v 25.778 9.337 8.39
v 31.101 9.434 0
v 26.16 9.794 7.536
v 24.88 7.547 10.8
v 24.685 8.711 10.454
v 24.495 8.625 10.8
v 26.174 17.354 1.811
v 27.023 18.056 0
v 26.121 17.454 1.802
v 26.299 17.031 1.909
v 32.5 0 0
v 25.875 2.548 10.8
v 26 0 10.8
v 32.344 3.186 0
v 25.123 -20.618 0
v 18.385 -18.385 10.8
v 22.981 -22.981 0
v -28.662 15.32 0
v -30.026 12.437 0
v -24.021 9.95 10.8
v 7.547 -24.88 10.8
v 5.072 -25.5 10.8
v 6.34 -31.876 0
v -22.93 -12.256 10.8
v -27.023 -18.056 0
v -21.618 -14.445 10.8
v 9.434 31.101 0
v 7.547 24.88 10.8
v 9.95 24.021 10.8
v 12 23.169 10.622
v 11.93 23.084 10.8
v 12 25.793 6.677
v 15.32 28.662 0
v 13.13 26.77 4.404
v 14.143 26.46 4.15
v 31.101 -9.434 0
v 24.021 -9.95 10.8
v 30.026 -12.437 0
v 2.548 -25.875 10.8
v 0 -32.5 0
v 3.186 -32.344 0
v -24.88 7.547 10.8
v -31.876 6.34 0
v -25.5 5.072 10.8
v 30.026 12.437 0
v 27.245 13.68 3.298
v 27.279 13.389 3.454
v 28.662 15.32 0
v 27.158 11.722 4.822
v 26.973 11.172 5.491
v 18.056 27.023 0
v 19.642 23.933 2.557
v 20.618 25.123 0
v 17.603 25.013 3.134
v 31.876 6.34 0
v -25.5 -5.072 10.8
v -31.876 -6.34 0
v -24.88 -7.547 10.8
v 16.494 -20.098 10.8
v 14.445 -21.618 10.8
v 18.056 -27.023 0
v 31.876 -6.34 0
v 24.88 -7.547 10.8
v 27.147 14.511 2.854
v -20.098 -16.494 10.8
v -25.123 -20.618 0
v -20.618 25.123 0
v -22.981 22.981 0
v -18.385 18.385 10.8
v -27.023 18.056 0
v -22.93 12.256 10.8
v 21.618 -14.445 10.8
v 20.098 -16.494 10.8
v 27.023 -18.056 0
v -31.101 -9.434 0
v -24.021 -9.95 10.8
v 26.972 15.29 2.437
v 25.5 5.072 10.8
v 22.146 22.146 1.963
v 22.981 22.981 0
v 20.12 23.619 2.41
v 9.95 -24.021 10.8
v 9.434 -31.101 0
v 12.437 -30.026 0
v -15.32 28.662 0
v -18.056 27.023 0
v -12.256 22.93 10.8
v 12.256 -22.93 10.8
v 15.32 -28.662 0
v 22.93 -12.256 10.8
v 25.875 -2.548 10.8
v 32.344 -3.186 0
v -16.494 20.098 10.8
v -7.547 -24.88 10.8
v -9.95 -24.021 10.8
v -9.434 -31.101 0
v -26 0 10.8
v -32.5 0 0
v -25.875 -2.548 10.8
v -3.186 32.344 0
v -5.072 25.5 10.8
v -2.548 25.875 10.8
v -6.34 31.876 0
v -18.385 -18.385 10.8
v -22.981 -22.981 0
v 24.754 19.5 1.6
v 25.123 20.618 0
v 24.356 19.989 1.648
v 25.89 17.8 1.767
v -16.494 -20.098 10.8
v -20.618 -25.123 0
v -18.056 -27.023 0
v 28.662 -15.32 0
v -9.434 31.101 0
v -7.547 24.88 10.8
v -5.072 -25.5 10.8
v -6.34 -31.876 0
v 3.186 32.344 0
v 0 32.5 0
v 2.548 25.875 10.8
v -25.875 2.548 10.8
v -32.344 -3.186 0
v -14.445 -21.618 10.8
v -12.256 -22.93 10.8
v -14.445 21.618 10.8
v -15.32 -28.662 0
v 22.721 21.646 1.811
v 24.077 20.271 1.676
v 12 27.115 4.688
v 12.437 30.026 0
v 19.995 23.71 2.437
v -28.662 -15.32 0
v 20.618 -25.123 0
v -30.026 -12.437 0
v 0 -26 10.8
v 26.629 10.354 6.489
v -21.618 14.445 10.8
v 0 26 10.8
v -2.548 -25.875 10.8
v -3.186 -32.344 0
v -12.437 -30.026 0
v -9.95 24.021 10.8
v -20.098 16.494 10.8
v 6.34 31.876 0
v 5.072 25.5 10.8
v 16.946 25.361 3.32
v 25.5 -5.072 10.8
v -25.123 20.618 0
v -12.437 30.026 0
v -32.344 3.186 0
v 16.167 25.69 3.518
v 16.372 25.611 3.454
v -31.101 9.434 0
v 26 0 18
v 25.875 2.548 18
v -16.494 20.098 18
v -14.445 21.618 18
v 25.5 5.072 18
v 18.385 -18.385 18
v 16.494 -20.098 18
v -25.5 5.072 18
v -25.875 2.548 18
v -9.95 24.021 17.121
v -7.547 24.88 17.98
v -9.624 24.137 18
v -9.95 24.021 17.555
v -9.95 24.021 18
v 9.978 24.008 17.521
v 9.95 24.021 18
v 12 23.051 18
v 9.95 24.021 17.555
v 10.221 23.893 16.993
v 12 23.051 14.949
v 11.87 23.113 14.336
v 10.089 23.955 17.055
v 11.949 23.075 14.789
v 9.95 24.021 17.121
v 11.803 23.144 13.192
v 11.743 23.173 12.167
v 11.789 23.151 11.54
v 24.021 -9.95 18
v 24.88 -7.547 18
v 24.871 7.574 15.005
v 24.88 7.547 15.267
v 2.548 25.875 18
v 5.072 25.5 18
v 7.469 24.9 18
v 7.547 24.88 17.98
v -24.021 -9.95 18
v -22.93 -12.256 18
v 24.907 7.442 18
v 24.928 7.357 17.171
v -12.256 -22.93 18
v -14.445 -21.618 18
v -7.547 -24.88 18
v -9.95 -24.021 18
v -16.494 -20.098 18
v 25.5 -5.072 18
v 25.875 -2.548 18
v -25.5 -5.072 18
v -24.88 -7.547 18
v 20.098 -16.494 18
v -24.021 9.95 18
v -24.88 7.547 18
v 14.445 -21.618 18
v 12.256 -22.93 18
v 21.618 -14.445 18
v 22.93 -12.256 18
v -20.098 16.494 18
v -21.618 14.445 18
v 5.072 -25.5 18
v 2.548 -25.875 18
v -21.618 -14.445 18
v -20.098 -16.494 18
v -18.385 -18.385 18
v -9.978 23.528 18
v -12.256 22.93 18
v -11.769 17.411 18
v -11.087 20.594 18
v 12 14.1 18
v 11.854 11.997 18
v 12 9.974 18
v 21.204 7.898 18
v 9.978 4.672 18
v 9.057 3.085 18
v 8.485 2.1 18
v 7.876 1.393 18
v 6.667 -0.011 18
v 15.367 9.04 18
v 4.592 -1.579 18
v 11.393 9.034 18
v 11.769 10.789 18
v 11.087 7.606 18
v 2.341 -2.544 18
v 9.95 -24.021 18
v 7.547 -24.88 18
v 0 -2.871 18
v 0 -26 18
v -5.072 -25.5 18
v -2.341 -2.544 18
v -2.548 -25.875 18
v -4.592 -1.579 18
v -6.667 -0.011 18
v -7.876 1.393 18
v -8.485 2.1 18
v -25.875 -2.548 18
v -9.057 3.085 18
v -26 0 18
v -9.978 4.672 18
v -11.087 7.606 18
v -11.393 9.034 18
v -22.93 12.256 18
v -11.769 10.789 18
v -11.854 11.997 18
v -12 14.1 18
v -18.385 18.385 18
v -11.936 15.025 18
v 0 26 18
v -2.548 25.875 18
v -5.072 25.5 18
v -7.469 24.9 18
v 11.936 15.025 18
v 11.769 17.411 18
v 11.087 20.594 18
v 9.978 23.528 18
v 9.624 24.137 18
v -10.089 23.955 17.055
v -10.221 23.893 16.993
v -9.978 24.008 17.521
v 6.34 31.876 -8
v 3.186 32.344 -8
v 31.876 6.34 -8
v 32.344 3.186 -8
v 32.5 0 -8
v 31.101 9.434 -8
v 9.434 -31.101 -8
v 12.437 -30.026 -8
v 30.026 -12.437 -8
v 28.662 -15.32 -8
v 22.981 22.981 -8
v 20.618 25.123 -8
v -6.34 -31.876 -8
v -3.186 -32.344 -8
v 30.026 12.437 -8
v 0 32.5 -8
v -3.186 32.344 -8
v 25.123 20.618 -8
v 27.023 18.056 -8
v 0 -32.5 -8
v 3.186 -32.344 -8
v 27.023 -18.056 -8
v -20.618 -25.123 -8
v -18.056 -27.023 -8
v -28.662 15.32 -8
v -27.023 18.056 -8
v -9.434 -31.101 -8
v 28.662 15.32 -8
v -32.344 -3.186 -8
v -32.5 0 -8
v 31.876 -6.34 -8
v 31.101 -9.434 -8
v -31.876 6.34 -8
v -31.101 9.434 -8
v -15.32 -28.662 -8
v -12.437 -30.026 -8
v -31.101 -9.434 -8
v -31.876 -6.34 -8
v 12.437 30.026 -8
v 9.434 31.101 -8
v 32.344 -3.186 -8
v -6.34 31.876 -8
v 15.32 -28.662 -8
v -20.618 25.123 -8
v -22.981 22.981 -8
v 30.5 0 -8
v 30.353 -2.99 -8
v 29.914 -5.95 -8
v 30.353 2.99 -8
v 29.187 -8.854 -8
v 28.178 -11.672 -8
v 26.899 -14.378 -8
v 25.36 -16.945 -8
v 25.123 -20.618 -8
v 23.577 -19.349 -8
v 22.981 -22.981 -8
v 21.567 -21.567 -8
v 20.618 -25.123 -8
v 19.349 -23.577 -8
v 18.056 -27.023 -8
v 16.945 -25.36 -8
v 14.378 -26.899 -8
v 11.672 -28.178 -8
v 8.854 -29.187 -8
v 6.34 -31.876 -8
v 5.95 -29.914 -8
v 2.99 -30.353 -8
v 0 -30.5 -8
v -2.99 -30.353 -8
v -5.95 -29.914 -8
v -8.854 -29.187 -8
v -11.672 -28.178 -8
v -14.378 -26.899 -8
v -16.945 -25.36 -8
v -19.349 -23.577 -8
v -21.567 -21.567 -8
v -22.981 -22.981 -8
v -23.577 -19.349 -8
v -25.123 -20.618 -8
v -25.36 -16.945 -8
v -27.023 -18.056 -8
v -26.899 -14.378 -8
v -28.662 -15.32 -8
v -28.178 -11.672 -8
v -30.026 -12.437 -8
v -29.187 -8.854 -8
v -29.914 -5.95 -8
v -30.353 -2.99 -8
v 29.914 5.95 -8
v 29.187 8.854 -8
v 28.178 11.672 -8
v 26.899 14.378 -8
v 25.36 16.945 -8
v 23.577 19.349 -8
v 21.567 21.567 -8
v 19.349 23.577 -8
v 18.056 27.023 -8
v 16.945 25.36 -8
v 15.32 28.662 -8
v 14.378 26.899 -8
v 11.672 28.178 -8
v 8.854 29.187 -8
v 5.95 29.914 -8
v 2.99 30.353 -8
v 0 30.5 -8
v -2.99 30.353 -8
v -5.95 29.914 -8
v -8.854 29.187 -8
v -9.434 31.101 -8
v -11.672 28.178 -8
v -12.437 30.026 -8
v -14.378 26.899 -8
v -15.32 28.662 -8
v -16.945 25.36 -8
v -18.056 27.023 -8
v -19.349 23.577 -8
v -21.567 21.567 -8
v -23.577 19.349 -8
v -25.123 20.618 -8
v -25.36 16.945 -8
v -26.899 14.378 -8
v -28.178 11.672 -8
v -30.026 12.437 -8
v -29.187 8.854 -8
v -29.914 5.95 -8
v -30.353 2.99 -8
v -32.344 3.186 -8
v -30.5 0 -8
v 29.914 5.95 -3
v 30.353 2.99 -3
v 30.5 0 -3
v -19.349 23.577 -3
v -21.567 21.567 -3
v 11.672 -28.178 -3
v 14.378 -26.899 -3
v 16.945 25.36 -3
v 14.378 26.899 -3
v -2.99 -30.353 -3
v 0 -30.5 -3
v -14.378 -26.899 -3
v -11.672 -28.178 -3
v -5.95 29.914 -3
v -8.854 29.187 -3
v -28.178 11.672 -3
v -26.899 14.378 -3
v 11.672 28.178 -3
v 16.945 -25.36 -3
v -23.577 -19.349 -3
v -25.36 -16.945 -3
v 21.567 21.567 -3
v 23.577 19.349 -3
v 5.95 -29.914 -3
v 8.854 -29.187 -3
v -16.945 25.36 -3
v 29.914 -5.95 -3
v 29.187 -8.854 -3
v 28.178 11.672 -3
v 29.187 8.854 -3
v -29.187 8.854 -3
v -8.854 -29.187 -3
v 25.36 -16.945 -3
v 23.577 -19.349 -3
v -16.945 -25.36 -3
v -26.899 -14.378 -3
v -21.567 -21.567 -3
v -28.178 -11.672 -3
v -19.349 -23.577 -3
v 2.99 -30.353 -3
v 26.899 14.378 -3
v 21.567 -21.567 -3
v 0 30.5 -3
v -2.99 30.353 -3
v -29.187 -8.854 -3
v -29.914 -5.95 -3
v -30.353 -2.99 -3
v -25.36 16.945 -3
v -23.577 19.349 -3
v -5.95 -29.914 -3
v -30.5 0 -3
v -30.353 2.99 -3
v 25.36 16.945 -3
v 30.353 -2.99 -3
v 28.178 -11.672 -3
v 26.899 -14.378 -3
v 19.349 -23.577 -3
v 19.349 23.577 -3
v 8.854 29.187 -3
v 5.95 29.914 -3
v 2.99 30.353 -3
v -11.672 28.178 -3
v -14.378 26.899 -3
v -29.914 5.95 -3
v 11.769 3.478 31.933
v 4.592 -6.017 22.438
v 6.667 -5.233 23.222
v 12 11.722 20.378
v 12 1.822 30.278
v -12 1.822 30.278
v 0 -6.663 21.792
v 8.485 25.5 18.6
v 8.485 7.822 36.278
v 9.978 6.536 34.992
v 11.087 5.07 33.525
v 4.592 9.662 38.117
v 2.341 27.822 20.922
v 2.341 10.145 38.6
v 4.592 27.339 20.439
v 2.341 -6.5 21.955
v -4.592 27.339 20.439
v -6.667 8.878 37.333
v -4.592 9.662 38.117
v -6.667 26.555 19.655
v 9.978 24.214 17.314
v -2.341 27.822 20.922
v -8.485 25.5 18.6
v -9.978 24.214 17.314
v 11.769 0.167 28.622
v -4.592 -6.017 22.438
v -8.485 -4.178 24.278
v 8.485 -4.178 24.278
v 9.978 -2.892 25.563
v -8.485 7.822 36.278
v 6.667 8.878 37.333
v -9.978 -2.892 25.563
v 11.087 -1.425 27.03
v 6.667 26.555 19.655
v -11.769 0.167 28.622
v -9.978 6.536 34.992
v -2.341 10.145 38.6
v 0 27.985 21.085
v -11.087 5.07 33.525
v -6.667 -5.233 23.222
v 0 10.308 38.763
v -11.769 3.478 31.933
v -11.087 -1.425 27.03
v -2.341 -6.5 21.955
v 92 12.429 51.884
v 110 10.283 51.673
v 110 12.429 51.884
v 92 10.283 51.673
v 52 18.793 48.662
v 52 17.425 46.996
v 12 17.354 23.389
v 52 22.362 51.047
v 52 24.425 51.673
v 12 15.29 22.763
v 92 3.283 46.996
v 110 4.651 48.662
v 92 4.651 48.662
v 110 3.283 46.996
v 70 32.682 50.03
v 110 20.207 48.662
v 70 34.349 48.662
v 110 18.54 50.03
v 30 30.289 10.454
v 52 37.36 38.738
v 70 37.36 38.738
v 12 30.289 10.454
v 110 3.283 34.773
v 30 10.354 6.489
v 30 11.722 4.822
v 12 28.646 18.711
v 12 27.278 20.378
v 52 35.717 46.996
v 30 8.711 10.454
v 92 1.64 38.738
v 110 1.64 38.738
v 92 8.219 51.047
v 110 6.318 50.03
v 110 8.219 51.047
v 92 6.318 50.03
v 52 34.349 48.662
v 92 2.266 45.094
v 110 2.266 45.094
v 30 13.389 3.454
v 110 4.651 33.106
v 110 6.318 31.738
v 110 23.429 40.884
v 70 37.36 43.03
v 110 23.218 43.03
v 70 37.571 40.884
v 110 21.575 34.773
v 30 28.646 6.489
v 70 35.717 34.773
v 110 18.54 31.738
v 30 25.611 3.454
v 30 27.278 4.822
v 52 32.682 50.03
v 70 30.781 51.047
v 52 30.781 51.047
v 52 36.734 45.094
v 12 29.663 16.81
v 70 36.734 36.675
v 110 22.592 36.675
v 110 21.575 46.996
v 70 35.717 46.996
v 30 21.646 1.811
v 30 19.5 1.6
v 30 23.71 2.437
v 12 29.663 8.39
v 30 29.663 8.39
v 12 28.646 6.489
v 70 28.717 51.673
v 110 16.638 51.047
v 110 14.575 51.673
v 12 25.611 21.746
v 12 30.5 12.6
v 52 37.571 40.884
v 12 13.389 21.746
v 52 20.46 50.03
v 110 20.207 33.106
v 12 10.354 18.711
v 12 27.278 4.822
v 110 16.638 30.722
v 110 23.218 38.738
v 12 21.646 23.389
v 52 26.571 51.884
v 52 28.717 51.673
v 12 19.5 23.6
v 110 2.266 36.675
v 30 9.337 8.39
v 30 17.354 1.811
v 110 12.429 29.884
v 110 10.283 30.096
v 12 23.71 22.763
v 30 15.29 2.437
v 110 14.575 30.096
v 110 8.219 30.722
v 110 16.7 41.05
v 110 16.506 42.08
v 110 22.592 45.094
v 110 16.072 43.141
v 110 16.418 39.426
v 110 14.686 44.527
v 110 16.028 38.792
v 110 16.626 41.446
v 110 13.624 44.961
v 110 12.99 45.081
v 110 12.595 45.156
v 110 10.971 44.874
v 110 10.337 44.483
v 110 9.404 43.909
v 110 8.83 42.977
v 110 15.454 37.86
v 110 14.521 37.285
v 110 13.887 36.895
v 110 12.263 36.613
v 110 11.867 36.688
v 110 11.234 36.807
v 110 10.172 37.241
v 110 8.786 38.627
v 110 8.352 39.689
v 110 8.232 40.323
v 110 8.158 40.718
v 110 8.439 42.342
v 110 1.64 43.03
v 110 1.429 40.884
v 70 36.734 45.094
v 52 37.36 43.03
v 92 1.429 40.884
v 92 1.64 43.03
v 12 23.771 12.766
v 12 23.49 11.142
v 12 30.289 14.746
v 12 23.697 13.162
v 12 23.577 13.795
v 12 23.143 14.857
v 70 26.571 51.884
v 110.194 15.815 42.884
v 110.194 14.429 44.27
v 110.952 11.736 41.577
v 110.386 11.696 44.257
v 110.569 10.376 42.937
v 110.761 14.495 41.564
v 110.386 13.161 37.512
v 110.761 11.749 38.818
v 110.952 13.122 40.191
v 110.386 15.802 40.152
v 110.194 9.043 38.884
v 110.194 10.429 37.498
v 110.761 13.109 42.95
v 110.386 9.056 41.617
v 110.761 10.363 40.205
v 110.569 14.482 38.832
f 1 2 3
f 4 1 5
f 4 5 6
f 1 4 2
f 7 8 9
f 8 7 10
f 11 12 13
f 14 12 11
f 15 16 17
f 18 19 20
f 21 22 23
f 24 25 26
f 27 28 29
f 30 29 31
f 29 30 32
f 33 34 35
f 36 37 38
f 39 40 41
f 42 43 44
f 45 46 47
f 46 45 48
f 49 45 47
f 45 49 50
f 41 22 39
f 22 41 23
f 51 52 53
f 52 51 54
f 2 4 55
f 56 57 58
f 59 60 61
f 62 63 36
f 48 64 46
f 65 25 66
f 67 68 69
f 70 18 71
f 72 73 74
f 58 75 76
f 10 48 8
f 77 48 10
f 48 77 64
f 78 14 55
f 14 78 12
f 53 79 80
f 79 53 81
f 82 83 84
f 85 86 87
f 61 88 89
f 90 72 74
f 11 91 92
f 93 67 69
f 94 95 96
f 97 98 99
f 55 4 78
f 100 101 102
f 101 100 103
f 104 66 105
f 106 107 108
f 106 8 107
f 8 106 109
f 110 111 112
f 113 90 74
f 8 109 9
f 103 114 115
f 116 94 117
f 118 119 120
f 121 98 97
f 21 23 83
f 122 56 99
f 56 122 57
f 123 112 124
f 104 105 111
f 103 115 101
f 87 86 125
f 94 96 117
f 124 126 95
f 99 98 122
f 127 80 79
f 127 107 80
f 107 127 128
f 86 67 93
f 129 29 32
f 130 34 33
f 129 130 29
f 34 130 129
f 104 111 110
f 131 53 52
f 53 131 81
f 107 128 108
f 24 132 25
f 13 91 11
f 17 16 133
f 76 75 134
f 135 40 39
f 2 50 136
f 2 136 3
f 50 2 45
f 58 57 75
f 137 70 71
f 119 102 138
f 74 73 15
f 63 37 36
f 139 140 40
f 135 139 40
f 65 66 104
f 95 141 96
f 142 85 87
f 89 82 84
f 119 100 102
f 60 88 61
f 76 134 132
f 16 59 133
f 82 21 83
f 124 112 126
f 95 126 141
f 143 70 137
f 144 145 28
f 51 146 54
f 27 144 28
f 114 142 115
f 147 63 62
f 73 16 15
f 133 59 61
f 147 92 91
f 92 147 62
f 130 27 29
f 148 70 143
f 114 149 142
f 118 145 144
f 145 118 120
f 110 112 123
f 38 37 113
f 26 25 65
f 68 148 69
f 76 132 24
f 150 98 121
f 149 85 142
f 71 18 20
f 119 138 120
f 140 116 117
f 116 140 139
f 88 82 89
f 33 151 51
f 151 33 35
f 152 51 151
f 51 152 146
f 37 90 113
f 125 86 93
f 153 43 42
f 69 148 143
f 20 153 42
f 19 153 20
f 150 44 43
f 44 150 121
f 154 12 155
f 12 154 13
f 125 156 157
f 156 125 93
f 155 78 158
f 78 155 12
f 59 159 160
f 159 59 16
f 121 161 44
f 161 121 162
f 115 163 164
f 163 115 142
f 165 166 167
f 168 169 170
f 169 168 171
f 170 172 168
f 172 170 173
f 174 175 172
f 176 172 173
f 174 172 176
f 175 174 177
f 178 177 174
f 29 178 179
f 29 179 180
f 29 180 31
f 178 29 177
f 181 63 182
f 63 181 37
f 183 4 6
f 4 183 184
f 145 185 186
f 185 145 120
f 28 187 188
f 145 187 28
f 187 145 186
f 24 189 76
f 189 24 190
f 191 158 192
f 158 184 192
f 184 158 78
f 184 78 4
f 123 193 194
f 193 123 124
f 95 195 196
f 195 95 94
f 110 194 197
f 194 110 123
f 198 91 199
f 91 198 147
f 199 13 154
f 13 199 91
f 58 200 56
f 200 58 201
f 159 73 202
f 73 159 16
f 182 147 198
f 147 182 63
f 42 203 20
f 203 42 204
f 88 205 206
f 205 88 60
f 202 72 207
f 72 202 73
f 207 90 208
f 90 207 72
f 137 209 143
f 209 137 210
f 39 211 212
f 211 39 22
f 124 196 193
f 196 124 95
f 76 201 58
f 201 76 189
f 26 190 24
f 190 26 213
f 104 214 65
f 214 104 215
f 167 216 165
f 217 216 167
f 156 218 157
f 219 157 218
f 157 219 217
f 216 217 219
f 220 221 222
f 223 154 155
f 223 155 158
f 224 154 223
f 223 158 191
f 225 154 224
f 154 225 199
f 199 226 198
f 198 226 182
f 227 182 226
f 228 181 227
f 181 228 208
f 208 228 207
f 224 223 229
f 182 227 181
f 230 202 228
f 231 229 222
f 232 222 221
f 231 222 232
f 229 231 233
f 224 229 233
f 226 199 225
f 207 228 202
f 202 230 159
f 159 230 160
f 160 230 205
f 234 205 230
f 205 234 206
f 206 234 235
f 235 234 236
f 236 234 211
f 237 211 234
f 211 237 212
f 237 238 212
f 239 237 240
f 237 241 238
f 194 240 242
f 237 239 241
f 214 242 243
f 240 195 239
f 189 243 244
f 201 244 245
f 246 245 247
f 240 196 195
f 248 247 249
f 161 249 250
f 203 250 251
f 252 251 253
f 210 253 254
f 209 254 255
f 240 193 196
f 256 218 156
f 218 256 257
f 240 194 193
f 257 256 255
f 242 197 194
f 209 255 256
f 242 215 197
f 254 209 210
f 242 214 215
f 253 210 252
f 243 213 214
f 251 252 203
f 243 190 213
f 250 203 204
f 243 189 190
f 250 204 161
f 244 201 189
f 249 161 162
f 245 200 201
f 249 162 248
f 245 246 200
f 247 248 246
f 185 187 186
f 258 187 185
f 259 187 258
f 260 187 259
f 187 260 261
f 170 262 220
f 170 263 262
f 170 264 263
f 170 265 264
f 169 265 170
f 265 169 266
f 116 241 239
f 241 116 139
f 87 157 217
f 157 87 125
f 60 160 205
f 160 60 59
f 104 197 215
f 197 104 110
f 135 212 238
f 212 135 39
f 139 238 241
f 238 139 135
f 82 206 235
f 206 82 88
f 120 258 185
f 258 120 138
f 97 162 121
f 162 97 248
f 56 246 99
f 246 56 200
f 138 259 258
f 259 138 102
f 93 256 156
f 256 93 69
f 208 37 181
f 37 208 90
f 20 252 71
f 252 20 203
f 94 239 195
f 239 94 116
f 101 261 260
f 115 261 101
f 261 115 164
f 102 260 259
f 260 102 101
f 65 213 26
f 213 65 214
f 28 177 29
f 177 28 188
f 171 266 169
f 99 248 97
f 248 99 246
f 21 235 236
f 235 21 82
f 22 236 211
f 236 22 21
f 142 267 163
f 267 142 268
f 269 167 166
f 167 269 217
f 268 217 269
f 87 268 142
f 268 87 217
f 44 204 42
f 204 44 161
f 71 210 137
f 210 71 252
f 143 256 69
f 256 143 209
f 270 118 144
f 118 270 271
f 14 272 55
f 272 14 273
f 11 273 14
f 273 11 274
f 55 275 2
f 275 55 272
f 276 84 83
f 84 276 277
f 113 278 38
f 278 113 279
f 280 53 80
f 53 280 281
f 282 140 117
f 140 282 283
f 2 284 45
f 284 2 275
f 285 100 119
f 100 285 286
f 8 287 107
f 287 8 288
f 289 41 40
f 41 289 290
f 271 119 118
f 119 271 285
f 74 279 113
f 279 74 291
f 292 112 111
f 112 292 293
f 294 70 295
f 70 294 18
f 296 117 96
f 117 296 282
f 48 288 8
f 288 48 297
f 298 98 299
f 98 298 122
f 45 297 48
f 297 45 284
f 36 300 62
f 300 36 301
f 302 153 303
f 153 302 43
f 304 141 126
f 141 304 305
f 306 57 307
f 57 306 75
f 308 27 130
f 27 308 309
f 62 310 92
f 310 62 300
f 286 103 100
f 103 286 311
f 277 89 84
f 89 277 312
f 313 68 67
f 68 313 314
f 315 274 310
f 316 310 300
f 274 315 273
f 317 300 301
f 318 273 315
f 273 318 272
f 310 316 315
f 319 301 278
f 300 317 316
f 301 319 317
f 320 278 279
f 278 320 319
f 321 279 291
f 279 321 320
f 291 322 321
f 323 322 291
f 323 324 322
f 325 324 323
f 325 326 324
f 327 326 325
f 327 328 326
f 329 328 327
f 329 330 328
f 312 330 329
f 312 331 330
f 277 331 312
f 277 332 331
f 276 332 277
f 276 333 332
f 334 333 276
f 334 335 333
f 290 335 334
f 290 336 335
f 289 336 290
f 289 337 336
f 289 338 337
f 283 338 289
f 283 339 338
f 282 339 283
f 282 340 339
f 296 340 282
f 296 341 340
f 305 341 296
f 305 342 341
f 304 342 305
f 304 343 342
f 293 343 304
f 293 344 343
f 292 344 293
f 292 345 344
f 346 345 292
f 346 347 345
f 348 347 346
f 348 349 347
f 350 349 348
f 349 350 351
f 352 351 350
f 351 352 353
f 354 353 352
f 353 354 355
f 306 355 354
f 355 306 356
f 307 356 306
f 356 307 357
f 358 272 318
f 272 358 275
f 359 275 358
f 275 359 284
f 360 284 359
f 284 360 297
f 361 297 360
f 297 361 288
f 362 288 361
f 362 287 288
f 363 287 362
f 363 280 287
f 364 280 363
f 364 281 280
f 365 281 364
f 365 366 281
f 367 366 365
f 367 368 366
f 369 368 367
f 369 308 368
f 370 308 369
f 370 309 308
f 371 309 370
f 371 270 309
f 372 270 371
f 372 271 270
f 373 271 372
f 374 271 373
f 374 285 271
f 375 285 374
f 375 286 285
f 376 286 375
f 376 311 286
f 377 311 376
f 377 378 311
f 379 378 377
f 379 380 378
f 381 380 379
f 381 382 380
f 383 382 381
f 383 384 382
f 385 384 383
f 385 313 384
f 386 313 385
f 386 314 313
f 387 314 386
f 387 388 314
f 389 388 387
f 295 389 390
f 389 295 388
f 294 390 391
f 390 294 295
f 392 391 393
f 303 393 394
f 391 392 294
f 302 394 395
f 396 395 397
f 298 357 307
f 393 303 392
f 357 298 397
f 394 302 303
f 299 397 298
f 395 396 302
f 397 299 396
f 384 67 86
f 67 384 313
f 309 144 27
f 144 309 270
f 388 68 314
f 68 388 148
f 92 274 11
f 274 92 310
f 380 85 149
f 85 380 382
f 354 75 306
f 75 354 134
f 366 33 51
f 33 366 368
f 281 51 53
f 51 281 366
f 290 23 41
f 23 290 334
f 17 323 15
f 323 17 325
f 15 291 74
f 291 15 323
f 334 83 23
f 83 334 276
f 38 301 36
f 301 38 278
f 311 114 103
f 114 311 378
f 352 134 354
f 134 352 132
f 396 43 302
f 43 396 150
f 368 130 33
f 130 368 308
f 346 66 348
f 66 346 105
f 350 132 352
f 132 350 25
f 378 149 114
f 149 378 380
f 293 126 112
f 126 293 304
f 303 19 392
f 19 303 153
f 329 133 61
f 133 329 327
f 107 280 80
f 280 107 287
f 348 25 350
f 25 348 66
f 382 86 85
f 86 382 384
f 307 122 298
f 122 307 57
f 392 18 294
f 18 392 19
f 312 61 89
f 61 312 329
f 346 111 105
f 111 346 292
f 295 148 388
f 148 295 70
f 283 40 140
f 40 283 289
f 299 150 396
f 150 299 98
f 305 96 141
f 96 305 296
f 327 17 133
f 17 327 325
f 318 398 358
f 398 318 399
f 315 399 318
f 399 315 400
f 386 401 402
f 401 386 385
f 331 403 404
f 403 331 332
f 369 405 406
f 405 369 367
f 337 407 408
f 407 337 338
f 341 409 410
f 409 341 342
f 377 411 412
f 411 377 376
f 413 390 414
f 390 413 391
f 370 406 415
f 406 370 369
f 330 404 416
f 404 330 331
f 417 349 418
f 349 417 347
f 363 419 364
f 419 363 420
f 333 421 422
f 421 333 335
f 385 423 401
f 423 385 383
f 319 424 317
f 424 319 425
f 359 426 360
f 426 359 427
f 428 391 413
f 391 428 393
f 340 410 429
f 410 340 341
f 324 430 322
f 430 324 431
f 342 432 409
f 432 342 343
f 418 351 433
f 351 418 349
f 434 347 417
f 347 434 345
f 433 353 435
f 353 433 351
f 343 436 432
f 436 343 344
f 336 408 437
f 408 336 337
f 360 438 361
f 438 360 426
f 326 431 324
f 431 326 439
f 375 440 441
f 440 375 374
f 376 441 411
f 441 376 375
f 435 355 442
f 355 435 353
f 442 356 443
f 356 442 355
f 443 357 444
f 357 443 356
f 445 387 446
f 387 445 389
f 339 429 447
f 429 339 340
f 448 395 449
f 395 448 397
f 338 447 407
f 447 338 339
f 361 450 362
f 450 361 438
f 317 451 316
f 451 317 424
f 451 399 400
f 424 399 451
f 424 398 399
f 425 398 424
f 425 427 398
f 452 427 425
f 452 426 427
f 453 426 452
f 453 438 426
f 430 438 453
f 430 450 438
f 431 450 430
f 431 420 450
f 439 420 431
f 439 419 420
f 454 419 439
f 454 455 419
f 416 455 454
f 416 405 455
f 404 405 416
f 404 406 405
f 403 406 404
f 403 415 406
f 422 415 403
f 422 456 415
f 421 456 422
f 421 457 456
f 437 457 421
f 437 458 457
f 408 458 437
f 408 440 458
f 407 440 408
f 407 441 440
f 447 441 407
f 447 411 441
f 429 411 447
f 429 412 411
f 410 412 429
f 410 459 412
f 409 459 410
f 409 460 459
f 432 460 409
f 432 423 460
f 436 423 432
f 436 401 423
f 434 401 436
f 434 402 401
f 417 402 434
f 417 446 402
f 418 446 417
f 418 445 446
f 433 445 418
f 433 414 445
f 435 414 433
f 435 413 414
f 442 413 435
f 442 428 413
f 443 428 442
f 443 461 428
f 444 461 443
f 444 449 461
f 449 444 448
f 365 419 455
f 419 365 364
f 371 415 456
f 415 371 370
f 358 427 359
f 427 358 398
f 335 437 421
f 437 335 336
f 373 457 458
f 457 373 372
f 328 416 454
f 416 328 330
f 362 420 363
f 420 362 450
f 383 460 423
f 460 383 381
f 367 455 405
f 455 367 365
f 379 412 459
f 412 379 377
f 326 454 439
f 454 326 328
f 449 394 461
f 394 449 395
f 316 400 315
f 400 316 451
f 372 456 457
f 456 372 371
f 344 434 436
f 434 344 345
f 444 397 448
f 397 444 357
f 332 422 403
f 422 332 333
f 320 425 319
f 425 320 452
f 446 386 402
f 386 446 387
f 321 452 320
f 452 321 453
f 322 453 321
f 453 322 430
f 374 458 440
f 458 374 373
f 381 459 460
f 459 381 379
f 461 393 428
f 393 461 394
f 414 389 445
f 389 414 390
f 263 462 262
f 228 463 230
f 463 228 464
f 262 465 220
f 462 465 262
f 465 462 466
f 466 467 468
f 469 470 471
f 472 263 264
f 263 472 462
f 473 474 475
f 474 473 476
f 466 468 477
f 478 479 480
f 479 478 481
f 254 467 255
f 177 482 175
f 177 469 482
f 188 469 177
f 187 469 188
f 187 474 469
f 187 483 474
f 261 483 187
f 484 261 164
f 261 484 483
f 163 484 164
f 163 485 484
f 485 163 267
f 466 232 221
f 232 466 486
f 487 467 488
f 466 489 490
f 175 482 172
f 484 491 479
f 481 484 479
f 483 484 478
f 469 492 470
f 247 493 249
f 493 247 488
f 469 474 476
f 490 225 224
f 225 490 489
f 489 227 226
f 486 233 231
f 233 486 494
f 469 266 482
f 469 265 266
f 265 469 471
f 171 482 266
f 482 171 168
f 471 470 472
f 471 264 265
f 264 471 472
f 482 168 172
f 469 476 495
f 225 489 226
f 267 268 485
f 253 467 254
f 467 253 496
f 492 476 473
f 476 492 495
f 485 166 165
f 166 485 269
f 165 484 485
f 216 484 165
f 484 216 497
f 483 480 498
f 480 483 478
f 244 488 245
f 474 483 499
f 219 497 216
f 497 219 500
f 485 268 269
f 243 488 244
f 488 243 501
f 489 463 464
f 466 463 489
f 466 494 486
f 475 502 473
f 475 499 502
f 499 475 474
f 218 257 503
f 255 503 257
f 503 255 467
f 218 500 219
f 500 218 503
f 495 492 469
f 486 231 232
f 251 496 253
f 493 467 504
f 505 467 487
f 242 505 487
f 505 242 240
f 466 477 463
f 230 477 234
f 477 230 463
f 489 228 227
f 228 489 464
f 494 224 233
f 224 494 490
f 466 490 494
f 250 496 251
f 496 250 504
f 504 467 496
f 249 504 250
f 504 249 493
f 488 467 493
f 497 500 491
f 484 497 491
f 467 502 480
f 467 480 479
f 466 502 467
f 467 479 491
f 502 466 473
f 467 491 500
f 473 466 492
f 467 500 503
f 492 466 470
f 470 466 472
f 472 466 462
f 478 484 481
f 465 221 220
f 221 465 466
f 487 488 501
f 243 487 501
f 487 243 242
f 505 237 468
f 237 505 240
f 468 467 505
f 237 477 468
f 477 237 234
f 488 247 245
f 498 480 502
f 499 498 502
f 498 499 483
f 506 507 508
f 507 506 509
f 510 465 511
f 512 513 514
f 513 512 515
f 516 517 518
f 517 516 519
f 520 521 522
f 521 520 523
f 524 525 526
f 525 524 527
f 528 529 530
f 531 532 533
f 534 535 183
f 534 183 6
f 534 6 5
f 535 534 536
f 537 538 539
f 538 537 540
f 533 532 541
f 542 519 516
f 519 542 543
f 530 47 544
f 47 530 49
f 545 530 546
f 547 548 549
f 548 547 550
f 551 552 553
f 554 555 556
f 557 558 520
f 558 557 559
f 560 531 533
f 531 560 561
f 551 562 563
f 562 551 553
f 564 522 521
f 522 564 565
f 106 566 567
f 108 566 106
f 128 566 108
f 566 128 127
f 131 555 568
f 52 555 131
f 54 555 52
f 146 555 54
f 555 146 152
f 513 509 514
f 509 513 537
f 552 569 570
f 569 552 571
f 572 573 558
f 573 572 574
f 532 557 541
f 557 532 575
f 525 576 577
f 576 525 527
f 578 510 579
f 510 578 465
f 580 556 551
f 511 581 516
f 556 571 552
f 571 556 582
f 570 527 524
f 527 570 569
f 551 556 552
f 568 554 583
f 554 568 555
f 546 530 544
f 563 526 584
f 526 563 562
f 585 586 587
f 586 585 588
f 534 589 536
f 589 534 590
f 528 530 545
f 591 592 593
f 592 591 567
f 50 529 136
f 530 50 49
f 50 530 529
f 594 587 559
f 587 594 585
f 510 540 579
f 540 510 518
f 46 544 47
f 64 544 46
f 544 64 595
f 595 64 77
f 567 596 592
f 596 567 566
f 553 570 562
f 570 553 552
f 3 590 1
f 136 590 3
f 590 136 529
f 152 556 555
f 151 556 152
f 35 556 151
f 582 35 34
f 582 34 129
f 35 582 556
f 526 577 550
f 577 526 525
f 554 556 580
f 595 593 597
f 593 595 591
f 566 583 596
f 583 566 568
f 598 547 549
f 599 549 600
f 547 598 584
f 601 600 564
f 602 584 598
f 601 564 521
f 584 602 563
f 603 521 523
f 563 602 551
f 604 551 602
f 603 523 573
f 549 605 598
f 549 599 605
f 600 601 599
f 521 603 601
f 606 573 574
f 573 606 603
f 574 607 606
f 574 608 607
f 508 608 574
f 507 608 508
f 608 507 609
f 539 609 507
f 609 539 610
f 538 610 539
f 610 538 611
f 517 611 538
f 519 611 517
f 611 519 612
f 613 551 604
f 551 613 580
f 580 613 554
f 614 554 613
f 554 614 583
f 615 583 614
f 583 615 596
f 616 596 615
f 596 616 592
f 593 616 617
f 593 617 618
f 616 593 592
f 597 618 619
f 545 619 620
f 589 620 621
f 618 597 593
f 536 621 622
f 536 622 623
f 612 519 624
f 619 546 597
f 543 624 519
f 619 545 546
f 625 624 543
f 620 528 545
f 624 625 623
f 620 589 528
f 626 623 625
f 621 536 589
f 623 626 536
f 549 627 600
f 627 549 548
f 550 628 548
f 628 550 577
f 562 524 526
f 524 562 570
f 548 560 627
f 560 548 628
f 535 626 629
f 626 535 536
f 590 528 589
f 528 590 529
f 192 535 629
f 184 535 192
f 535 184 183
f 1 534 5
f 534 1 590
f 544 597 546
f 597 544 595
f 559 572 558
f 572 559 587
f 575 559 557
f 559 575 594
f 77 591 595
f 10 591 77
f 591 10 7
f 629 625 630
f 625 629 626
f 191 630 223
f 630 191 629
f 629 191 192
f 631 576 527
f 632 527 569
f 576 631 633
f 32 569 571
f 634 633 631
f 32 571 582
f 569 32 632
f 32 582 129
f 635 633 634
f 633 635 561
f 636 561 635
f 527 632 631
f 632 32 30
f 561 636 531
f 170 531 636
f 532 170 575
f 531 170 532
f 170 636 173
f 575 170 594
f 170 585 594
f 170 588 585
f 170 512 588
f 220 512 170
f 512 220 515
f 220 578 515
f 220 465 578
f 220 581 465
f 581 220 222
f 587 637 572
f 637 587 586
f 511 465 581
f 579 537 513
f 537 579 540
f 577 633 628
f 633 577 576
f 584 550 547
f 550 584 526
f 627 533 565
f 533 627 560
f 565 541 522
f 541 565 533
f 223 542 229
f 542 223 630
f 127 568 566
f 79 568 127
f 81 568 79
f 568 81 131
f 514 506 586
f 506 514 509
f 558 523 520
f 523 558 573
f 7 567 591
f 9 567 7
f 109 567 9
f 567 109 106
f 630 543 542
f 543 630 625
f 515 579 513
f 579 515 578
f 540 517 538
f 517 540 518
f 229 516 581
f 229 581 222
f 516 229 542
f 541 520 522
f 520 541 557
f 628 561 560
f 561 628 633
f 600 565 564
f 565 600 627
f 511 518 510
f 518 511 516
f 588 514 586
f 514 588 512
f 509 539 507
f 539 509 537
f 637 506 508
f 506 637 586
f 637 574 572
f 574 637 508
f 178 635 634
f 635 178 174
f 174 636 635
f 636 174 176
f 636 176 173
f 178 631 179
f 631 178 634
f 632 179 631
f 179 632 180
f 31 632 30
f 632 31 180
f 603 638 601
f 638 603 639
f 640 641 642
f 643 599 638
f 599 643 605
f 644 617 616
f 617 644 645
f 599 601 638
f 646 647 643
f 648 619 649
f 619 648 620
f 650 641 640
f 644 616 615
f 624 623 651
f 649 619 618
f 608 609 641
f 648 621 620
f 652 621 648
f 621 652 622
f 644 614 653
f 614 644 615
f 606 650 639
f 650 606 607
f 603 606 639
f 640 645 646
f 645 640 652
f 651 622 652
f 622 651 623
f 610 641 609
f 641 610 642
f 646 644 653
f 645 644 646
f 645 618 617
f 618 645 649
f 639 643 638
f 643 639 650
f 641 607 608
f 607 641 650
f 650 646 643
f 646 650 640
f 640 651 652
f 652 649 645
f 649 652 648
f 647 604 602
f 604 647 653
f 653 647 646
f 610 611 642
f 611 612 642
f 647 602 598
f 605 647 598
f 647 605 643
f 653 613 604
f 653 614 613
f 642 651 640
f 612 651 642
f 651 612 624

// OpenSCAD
phone_width = 71.6;
phone_height = 147.6;
phone_depth = 7.8;

wall_thickness = 2.5;
tolerance = 2;
cradle_depth = 12;

base_diameter = 65;
base_height = 18;
suction_rim_height = 8;

arm_thickness = 18;
arm_width = 22;
joint_ball_diameter = 20;



module pritrdi_na_avto() {
translate([0, 0, 0]) {
cylinder(h=base_height*0.6, d1=base_diameter, d2=base_diameter*0.8, $fn=64);
//zgornja
translate([0, 0, base_height*0.6])
cylinder(h=base_height*0.4, d=base_diameter*0.8, $fn=64);
}
    
translate([0, 0, -suction_rim_height])
difference() {
cylinder(h=suction_rim_height, d=base_diameter, $fn=64);
translate([0, 0, -1])
cylinder(h=suction_rim_height-2, d=base_diameter-4, $fn=64);
}
    
//dam skuoaj
translate([0, base_diameter*0.3, base_height*0.7])
rotate([45, 0, 0])
cylinder(h=25, d=joint_ball_diameter+4, $fn=32);
}



module rocaj() {
hull() {
translate([0, 0, 0])
rotate([0, 90, 0])
cylinder(h=arm_thickness, d=arm_width, $fn=32);
        
//srednji del
translate([40, 25, 15])
rotate([0, 90, 0])
cylinder(h=arm_thickness, d=arm_width, $fn=32);
        
//koncni del
translate([80, 15, 25])
rotate([0, 90, 0])
cylinder(h=arm_thickness, d=arm_width, $fn=32);
    }
    
//zdruzim na zacetku
translate([arm_thickness/2, 0, 0])
sphere(d=joint_ball_diameter, $fn=32);
    
translate([80 + arm_thickness/2, 15, 25])
sphere(d=joint_ball_diameter, $fn=32);
}







// Complete assembly
module celotno_drzalo_za_telefon() {
    // Suction cup base
    color("gray"){
    pritrdi_na_avto();
    
    // Curved arm
    translate([0, base_diameter*0.3, base_height*0.7])
        rotate([45, 0, 0])
            translate([12, 0, 0])
                rocaj();
    

   
}
}


celotno_drzalo_za_telefon();
